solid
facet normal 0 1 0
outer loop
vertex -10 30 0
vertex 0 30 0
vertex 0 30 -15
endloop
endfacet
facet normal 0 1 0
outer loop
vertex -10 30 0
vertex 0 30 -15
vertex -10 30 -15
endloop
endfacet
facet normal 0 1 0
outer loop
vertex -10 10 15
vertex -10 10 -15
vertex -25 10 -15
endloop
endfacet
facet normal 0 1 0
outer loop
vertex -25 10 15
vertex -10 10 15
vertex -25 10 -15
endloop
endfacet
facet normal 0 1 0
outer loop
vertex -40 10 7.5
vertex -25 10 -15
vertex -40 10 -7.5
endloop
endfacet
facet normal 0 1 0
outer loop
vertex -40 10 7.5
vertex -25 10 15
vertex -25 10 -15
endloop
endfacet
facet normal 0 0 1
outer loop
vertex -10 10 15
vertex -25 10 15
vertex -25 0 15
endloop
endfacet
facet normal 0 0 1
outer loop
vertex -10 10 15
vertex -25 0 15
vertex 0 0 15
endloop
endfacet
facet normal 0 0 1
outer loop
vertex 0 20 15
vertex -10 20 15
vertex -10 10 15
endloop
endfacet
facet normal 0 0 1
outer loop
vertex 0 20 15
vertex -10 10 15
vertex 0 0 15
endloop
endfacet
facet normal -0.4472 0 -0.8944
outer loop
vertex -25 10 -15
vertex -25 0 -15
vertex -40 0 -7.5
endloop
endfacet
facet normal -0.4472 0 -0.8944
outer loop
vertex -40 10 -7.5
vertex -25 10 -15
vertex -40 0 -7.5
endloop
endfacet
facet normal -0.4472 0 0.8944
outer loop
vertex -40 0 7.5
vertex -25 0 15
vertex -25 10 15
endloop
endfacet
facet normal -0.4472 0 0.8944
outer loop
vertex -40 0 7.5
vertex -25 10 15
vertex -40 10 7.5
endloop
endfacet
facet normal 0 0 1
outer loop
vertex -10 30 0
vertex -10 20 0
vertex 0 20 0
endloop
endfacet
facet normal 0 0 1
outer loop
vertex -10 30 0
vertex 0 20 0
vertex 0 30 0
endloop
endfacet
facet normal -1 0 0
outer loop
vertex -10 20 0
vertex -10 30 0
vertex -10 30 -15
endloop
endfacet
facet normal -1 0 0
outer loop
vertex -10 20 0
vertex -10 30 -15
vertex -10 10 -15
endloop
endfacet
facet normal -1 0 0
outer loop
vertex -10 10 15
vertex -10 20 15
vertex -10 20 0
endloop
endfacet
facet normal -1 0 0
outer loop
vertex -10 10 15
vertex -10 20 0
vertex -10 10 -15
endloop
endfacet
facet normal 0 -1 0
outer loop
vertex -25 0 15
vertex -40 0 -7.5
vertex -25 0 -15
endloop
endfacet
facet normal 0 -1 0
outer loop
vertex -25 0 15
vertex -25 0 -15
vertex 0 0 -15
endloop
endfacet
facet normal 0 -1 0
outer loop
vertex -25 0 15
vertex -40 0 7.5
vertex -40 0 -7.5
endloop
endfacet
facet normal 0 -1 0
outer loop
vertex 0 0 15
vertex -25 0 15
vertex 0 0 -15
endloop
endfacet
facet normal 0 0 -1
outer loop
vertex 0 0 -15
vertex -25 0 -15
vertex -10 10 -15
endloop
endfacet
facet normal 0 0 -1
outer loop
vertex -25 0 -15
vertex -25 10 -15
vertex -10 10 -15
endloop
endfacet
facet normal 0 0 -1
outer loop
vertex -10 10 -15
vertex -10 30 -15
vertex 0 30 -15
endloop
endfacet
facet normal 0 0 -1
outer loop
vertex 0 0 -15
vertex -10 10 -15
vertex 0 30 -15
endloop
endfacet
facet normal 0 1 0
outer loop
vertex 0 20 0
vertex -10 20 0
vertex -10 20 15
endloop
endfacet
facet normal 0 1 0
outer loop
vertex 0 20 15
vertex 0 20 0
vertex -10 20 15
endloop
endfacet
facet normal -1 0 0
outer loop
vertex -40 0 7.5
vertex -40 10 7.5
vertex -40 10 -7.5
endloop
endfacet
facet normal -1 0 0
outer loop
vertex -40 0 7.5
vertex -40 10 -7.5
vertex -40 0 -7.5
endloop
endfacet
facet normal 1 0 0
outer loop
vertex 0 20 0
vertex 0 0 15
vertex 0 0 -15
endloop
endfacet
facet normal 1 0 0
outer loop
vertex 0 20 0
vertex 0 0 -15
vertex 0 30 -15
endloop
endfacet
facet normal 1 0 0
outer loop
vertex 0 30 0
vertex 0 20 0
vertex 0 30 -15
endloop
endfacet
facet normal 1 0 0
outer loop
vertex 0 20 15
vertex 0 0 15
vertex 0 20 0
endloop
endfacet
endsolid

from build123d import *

# Parameters (mm, degrees)
Y_KSEKLIK_EKSTR_ZYON1_DEPTH = 15
KES_EKSTR_ZYON1_DEPTH       = 10
IZIM4_W                     = 15
IZIM4_H                     = 10
KES_EKSTR_ZYON2_DEPTH       = 10


with BuildPart() as part:
    # Çizim2 → Yükseklik-Ekstrüzyon1 (new, symmetric)
    with BuildSketch(Plane.XY):
        Polygon((0, 0), (0, 30), (-10, 30), (-10, 10), (-40, 10), (-40, 0), align=None)
    extrude(amount=Y_KSEKLIK_EKSTR_ZYON1_DEPTH, both=True)

    # Çizim3 → Kes-Ekstrüzyon1 (cut)
    with BuildSketch(Plane(origin=(0, 0, 0), x_dir=(1, 0, 0), z_dir=(0, 1, 0))):
        Polygon((-40, 15), (-25, 15), (-40, 7.5), align=None)
        Polygon((-25, -15), (-40, -7.5), (-40, -15), align=None)
    extrude(amount=KES_EKSTR_ZYON1_DEPTH, mode=Mode.SUBTRACT)

    # Çizim4 → Kes-Ekstrüzyon2 (cut)
    with BuildSketch(Plane.ZY.offset(10)):
        with Locations((7.5, 25)):
            Rectangle(IZIM4_W, IZIM4_H)
    extrude(amount=-KES_EKSTR_ZYON2_DEPTH, mode=Mode.SUBTRACT)


solid = part.part
